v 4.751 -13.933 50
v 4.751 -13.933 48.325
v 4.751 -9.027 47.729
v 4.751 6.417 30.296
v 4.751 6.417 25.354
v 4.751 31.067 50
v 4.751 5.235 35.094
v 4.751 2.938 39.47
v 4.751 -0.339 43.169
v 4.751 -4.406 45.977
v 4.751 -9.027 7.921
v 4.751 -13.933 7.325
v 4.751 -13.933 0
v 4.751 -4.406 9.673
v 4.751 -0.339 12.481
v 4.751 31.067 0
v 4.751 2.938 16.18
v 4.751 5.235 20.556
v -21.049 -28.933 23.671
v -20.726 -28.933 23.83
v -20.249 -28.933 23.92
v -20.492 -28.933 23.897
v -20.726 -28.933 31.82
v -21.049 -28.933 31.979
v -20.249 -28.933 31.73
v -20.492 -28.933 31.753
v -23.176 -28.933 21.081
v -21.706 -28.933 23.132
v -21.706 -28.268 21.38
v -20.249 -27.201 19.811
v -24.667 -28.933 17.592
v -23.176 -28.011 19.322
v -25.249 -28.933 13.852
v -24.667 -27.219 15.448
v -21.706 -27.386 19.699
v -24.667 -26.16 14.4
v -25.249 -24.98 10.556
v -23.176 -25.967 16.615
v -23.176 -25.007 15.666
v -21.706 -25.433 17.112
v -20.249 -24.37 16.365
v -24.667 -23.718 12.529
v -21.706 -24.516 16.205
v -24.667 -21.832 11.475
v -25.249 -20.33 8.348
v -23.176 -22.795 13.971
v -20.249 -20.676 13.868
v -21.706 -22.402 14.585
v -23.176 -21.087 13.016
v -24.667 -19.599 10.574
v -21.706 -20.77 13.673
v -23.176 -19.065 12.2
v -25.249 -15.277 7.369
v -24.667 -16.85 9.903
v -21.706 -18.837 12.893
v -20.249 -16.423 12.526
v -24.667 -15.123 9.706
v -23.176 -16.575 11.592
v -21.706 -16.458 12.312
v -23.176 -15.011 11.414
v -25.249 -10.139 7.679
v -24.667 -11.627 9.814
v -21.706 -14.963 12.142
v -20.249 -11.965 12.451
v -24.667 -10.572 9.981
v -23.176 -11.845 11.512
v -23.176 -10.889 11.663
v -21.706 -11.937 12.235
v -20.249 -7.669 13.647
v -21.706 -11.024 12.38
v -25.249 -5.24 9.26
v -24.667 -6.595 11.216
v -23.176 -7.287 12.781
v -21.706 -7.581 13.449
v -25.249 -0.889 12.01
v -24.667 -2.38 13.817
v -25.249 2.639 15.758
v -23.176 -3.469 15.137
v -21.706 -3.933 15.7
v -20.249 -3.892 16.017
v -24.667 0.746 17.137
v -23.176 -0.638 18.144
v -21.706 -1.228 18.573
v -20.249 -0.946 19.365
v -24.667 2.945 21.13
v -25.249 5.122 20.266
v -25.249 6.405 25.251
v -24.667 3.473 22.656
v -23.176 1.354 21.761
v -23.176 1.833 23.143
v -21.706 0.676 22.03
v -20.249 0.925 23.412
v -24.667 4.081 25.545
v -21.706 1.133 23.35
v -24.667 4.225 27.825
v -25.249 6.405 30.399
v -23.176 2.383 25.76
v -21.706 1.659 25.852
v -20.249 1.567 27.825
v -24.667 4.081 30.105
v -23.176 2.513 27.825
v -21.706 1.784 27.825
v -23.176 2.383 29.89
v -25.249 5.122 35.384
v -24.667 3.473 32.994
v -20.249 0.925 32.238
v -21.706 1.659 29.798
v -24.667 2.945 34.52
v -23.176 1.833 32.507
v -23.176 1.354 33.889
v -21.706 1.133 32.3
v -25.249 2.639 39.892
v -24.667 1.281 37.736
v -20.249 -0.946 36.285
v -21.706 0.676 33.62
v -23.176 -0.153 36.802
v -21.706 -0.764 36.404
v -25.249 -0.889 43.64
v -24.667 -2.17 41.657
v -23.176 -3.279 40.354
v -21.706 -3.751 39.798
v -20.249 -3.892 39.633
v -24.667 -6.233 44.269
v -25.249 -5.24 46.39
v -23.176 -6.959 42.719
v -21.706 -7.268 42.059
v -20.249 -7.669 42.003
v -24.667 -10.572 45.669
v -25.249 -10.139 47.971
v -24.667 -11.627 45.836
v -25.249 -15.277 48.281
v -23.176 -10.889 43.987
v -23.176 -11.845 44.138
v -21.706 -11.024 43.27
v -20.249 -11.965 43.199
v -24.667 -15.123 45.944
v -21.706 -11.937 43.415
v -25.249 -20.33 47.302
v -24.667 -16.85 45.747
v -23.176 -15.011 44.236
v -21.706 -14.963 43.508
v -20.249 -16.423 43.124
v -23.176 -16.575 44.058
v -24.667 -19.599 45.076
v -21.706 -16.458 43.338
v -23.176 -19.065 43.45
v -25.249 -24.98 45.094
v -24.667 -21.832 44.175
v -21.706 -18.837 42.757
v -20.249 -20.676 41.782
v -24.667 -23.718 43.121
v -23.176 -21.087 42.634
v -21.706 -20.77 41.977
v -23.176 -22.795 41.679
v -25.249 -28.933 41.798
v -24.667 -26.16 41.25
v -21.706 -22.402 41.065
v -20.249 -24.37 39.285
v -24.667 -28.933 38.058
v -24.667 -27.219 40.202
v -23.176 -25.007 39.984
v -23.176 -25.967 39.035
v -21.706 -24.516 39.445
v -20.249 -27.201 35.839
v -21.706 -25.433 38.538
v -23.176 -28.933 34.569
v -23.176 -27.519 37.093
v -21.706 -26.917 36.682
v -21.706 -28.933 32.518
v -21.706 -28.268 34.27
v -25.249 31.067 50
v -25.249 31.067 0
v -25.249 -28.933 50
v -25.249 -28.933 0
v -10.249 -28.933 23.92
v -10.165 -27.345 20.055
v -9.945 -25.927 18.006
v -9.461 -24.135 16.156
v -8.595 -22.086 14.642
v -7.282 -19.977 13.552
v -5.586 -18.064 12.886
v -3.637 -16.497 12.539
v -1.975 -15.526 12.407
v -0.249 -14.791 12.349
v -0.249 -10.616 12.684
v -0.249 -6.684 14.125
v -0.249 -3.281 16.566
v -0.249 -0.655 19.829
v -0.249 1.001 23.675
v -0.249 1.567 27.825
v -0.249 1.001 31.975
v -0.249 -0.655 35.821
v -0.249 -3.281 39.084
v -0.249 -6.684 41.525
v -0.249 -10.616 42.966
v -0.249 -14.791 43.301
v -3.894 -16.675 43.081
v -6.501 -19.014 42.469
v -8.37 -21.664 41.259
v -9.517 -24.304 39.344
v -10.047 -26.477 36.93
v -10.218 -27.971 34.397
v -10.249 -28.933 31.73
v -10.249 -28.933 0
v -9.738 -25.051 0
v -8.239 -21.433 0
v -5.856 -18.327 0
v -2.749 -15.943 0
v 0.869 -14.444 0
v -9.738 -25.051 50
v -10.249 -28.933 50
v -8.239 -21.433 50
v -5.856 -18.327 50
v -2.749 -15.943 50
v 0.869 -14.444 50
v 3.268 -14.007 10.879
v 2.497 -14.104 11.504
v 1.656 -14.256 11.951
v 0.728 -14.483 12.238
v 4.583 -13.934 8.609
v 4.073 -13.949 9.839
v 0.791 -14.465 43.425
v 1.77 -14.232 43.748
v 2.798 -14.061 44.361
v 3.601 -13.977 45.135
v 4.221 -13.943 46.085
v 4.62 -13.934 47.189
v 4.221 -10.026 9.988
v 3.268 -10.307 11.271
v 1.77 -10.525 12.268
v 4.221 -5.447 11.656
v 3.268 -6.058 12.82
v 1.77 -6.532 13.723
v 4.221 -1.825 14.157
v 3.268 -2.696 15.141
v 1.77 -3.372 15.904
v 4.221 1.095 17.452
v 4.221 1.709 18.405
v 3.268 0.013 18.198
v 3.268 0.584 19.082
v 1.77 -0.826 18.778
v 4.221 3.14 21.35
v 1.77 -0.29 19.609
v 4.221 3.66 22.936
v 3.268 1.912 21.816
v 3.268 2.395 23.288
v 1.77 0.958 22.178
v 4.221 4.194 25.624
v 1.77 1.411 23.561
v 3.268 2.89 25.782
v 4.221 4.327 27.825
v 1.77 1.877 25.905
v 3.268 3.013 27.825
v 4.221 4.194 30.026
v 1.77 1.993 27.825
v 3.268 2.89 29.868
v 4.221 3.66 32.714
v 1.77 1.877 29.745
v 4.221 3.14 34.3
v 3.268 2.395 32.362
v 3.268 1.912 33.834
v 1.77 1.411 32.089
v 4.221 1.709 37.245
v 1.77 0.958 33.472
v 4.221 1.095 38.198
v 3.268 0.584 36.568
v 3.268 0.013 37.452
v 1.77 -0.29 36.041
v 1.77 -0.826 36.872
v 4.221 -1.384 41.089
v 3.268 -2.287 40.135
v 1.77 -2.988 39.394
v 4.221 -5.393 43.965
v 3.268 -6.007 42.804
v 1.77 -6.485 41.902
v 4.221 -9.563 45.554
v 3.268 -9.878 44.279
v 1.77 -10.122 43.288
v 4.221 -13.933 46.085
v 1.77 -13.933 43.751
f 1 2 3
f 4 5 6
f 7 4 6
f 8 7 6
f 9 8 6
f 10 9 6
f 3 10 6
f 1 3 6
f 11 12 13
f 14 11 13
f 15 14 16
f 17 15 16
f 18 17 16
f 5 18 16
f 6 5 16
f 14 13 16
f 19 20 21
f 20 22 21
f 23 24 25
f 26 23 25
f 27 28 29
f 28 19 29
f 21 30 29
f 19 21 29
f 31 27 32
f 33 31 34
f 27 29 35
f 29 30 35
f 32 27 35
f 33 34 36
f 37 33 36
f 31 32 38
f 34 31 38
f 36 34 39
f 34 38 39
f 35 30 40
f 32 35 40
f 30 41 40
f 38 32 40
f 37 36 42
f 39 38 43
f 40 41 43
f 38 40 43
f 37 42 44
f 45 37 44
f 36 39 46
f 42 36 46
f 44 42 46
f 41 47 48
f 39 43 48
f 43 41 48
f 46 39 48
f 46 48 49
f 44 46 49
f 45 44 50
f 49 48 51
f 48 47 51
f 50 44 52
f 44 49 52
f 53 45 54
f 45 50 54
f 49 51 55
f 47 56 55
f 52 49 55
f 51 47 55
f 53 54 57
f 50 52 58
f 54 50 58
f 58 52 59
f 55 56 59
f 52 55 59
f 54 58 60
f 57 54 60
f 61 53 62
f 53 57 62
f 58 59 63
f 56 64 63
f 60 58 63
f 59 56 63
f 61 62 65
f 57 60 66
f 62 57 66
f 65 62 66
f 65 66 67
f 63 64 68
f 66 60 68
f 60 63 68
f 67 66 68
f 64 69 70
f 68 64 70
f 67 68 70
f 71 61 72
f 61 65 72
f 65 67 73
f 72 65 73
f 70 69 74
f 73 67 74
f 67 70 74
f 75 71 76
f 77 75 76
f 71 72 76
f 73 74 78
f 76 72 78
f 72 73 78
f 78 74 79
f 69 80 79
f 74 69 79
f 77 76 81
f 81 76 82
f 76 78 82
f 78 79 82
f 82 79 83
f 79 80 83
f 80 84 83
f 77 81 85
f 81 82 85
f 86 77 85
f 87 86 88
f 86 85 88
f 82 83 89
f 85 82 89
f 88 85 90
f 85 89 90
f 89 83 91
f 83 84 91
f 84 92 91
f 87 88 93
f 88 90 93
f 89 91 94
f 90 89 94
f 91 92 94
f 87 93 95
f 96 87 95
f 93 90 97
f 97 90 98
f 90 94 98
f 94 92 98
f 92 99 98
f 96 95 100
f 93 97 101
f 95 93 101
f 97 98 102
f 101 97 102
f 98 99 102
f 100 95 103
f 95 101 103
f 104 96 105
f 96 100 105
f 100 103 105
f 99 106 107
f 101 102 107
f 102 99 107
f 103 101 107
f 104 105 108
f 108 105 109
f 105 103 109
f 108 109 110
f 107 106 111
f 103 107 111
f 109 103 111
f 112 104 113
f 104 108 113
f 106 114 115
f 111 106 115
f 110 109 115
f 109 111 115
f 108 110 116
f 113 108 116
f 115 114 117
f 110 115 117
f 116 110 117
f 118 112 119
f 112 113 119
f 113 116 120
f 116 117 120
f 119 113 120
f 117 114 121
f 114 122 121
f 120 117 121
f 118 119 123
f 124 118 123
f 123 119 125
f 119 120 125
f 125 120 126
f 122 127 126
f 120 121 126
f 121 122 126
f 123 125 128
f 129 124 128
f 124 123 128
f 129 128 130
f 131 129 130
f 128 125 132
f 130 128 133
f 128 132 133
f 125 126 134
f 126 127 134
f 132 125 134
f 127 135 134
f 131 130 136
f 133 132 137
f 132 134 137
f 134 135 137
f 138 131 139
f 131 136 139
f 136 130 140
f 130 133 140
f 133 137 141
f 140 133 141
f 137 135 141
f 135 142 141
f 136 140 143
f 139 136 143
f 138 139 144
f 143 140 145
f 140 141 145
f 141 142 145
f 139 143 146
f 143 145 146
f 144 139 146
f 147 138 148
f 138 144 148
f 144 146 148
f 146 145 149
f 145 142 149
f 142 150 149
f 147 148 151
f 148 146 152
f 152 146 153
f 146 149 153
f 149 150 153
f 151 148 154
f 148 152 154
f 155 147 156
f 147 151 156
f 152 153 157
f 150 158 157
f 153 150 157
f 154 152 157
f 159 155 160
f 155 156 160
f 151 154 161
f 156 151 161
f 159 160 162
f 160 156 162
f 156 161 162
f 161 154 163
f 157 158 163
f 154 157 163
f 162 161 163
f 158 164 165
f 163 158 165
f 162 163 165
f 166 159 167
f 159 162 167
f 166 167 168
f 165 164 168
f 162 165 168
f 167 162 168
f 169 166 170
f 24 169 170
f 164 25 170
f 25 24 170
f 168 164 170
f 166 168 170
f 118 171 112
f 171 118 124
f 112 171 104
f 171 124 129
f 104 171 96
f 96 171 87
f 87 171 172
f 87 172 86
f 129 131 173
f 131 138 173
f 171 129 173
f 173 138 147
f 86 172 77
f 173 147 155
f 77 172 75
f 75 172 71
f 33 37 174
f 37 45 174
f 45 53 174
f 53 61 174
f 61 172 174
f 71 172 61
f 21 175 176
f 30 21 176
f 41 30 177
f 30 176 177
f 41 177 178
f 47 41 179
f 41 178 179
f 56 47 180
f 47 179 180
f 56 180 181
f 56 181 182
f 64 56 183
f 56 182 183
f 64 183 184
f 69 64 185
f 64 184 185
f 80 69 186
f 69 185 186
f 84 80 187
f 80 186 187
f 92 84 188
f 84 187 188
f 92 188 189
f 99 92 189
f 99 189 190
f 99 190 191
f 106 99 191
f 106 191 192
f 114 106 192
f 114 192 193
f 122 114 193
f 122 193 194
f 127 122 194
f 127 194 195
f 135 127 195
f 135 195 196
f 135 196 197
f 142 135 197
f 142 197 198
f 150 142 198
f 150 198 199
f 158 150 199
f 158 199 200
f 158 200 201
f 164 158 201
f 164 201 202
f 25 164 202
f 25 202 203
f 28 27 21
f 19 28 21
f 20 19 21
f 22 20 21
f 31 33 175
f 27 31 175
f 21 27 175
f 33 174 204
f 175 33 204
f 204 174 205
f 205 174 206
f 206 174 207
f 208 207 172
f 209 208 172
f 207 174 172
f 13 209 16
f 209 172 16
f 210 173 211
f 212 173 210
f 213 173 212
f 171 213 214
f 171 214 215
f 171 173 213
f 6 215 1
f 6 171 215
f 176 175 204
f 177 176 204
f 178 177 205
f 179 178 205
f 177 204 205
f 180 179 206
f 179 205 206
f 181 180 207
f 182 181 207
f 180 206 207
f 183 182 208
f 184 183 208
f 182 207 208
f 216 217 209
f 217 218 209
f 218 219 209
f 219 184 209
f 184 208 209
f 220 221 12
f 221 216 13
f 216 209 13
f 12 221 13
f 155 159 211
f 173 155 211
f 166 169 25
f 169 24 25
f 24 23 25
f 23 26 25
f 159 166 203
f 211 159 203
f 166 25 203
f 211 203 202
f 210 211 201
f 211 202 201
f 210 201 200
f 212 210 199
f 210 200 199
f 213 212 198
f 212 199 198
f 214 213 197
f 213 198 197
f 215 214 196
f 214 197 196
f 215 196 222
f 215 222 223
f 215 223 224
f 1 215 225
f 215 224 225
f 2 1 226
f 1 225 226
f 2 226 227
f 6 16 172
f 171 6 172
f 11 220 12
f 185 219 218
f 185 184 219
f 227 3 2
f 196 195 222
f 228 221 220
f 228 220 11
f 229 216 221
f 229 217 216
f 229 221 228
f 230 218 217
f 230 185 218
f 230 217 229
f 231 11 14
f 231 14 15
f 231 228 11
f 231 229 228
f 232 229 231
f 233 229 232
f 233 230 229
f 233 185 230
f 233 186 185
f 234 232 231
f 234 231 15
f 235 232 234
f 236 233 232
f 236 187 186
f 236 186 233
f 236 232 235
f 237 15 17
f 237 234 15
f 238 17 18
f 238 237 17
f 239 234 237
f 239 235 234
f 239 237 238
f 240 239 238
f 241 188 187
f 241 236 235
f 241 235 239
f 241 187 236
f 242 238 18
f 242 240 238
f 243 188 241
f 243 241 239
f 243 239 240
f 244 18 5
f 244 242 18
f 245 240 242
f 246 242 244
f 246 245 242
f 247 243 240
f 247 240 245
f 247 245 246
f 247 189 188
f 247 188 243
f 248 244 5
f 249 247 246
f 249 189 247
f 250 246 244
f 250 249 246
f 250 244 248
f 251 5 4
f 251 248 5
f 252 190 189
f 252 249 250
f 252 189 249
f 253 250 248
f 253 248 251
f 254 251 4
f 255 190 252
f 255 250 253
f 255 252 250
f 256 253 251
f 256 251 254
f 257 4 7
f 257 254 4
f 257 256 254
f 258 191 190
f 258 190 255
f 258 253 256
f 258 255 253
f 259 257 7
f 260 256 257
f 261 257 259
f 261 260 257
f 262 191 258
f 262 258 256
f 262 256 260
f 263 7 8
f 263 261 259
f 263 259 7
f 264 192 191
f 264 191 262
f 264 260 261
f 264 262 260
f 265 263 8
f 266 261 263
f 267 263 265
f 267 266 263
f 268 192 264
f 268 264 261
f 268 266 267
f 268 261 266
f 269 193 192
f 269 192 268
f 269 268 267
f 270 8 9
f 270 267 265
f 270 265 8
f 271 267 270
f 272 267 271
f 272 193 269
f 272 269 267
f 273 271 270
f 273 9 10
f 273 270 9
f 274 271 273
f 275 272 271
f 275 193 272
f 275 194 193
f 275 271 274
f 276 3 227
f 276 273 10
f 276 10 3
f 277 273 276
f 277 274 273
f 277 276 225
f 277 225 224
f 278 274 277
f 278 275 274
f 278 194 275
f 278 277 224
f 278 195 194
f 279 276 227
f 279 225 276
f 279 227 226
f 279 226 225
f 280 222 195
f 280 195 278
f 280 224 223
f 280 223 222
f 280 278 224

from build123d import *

# Parameters (mm, degrees)
F1_DEPTH = 50
F2_R     = 15.5
F3_DEPTH = 70
F4_R     = 5


with BuildPart() as f1:
    # F0 (on Top) → F1 (new body)
    with BuildSketch(Plane.XY):
        with BuildLine():
            Line((-25.2489881364, 31.0668002069), (-25.2489881364, -28.9331997931))
            Line((-25.2489881364, -28.9331997931), (-10.2489881364, -28.9331997931))
            ThreePointArc((-10.2489881364, -28.9331997931), (-5.8555898542, -18.3265980753), (4.7510118636, -13.9331997931))
            Line((4.7510118636, -13.9331997931), (4.7510118636, 31.0668002069))
            Line((4.7510118636, 31.0668002069), (-25.2489881364, 31.0668002069))
        make_face()
    extrude(amount=F1_DEPTH)

    # F2 (on face) → F3 (cut)
    with BuildSketch(Plane.YZ.offset(4.7510118636)):
        with Locations((-13.9331997931, 27.8249997646)):
            Circle(F2_R)
    extrude(amount=-F3_DEPTH, mode=Mode.SUBTRACT)

    # F4
    f4_edges = [f1.edges().sort_by_distance(p)[0] for p in [
        (4.751012, 1.5668, 27.825),
        (-25.248988, 1.5668, 27.825),
    ]]
    fillet(f4_edges, radius=F4_R)


solid = f1.part
